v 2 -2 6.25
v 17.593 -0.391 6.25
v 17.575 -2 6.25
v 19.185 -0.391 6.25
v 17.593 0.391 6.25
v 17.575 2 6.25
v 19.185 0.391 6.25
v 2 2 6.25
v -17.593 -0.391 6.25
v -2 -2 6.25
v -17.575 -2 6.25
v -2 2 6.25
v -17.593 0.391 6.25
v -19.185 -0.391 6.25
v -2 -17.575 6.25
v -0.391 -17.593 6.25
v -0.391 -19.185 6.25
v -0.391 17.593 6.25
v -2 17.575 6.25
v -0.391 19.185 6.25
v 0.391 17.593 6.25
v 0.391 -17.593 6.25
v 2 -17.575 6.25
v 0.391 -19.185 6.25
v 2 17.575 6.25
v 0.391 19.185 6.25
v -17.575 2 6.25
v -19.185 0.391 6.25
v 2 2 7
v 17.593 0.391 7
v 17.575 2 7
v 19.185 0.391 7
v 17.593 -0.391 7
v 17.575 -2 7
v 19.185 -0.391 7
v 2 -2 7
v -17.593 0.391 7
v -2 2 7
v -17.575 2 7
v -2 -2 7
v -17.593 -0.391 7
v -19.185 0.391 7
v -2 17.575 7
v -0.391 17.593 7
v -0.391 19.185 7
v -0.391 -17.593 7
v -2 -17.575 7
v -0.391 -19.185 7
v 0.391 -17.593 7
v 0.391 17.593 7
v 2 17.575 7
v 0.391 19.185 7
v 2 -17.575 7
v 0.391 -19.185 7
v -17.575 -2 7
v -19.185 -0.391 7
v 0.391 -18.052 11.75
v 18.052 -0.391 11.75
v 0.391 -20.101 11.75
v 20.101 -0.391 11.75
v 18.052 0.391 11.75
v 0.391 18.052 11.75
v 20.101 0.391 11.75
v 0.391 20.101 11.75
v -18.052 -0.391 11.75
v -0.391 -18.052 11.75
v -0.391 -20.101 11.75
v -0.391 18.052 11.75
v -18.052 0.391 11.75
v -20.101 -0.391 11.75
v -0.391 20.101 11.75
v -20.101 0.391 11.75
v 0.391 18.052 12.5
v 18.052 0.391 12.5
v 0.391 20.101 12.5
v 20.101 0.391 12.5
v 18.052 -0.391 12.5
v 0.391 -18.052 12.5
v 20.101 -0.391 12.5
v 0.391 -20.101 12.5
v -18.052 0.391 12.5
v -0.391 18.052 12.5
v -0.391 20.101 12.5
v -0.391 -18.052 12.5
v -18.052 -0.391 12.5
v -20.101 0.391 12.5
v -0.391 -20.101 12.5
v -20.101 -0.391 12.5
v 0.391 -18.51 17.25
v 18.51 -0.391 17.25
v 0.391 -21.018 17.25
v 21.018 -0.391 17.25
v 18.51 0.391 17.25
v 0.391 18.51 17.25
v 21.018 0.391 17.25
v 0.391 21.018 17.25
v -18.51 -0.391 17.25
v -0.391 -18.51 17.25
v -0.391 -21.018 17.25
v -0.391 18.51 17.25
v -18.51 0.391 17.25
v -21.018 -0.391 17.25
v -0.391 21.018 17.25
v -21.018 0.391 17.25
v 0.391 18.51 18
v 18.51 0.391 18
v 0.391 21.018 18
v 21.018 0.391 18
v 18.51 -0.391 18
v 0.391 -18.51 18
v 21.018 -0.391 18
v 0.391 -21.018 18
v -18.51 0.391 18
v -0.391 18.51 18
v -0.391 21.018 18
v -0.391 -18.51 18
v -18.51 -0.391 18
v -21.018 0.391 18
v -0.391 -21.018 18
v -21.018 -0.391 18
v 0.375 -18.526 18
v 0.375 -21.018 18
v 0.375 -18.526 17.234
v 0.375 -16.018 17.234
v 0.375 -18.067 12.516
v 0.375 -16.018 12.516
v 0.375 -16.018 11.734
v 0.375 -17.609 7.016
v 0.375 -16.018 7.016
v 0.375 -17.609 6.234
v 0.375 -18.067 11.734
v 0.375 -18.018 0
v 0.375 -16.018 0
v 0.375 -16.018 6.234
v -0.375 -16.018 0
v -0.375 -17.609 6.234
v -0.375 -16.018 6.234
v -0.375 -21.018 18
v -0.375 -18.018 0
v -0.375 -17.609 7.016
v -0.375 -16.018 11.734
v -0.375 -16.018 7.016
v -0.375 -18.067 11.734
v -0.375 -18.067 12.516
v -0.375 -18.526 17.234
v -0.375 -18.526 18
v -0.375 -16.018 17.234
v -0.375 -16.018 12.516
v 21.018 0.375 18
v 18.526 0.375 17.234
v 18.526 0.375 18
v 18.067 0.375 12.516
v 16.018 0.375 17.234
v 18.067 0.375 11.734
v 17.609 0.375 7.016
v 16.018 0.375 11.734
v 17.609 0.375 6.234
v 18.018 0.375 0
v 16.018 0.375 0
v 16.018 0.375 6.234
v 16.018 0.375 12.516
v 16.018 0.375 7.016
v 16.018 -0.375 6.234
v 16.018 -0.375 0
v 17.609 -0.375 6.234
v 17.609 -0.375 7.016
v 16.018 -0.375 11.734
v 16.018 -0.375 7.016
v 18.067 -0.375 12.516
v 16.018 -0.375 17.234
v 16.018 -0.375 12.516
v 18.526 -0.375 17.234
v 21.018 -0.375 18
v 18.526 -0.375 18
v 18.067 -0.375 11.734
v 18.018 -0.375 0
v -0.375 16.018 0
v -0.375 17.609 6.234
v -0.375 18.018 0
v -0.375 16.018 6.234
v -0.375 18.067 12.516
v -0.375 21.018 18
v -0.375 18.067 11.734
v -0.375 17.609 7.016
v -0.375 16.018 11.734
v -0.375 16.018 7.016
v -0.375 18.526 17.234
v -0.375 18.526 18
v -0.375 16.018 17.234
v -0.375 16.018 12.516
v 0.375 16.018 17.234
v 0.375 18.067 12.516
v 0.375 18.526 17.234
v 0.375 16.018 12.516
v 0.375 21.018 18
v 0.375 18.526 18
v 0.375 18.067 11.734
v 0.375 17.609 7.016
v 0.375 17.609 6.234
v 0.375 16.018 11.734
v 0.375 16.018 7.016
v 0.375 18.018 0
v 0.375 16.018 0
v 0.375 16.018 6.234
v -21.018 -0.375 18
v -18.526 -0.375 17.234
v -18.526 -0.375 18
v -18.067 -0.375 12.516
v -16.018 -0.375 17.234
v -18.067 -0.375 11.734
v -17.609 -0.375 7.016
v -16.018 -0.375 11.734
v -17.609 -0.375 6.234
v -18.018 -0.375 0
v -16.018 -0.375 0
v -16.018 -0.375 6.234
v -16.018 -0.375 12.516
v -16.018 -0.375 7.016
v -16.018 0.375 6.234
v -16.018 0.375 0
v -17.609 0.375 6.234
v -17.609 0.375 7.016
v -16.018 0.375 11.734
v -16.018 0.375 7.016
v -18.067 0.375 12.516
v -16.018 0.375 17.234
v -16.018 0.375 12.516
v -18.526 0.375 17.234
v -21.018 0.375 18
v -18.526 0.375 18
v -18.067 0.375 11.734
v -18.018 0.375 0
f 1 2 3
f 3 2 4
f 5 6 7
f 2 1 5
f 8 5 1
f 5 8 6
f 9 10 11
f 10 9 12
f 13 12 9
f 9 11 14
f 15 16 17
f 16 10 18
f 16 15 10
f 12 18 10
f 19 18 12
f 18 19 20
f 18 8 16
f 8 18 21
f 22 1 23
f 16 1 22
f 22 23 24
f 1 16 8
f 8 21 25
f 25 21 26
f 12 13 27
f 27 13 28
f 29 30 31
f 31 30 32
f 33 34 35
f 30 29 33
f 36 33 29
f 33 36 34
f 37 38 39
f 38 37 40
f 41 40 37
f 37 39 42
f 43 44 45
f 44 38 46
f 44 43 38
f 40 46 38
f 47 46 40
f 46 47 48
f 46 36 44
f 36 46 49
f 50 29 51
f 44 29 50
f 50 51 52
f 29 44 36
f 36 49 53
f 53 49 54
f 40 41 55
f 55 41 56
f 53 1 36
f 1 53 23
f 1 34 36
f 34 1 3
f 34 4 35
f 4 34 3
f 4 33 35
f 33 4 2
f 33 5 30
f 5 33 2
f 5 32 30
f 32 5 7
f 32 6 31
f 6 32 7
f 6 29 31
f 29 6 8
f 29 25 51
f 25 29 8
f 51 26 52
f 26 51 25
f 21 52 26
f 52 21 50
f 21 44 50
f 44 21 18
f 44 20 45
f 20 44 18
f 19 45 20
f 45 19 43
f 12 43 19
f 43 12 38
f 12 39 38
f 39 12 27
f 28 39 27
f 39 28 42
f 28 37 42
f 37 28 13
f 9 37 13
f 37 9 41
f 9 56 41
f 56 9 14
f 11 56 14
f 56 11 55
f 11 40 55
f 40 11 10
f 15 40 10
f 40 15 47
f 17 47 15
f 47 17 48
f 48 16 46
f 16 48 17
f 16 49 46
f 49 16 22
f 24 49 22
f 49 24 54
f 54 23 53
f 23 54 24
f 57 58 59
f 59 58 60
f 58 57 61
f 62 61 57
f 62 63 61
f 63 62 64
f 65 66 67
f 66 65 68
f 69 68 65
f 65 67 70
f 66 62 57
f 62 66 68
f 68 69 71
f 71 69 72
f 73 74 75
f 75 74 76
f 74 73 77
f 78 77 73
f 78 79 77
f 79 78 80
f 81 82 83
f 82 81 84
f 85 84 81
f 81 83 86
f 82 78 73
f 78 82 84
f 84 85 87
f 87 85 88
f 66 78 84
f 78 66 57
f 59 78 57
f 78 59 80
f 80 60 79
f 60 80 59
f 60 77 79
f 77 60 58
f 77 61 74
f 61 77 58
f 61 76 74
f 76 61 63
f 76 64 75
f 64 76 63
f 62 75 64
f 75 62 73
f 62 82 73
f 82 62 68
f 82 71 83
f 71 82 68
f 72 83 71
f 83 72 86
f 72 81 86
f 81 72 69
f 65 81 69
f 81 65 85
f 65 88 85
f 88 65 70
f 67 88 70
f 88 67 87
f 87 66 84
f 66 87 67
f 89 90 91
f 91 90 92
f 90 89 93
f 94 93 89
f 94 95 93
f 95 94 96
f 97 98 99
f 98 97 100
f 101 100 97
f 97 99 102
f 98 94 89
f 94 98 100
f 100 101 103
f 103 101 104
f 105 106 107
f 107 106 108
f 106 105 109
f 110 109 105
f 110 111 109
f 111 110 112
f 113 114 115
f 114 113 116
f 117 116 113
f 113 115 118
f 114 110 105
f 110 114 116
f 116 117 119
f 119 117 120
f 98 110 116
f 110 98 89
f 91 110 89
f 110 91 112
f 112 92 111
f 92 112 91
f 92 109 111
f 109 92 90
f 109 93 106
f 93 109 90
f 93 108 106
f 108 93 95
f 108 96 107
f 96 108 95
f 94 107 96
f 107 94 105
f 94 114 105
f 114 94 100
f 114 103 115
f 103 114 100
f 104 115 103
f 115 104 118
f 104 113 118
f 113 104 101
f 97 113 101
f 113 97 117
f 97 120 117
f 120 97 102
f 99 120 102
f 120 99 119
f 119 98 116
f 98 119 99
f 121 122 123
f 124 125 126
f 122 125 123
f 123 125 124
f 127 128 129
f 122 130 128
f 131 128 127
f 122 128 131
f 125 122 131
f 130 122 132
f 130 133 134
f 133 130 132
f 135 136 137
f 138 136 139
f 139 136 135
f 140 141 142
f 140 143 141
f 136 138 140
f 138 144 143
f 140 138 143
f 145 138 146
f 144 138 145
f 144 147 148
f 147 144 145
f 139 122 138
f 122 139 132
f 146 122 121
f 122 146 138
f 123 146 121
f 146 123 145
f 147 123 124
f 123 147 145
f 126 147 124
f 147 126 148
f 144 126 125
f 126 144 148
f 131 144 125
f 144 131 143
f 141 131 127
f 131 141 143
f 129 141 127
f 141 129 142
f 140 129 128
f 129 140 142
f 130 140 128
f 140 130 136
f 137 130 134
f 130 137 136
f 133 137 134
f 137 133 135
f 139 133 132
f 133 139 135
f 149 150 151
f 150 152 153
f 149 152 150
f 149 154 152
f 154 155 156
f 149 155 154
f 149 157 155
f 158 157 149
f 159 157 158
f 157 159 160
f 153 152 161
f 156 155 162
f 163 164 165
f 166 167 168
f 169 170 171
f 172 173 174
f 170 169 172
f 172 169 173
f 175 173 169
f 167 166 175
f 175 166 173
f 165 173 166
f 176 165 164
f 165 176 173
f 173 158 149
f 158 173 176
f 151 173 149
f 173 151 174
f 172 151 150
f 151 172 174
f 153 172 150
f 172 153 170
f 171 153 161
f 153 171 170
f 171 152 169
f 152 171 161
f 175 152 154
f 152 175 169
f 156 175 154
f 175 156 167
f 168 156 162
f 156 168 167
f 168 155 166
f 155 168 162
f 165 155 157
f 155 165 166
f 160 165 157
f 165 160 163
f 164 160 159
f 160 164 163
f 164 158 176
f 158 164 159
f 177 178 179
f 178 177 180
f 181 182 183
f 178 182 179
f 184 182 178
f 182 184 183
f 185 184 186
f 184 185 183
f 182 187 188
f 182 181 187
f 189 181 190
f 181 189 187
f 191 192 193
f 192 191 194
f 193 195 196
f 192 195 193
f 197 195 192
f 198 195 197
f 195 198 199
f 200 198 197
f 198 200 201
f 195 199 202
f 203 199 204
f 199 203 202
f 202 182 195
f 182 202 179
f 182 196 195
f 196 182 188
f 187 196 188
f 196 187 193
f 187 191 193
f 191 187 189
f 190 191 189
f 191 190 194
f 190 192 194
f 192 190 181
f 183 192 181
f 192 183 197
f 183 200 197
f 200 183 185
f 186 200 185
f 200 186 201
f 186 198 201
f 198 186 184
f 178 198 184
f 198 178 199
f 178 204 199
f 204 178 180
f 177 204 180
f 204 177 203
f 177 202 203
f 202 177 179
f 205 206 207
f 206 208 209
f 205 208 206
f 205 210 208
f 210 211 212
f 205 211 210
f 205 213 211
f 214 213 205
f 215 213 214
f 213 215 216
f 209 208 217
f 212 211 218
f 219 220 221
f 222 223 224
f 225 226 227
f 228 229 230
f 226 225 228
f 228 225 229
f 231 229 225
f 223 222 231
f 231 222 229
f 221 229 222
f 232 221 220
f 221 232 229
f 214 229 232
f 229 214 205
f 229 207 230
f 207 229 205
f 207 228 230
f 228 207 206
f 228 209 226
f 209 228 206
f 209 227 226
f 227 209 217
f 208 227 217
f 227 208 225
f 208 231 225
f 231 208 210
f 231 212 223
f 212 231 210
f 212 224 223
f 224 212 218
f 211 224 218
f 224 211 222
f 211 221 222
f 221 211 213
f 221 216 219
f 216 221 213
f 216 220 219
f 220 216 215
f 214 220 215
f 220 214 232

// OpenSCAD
// file: ../src/functions.scad
module shelf(type, diameter,leg_width) {
    if (type == 0)
    round_shelf(diameter, leg_width);
    if (type == 1)
    square_shelf(diameter, leg_width);
    if (type == 2)
    square_shelf_leg_supports(diameter, leg_width);
}

module round_shelf(diameter,leg_width) {
    difference() {
        circle(d=diameter);
        leg_slots(diameter, leg_width);
    }
}

module square_shelf(diameter,leg_width) {
    difference() {
        hull() {
            leg_slots(diameter, leg_width);
        }
        leg_slots(diameter, leg_width);
    }
}

module square_shelf_leg_supports(diameter,leg_width) {
    intersection() {
        square_shelf(diameter, leg_width);
        for(i=[0:leg_count-1]) {
            rotate(i*360/leg_count)
            translate([-leg_support/2,-diameter/2])
            square([leg_support,diameter/2]);
        }
    }
}


module leg_slots(diameter, leg_width) {
    for(i=[0:leg_count-1]) {
        rotate(i*360/leg_count)
        translate([-leg_thick/2-gap,-diameter/2])
        square([leg_thick+gapp,leg_width]);
    }
}

module shelf_number(i) {
        shelf(shelves[i], tan(leg_angle)*((top_height-leg_height)/(shelf_count-1)*i+leg_height)*2+bottom,(tan(leg_angle)*((top_height-leg_height)/(shelf_count-1)*i+leg_height)+min_leg)/2+gap/2);
}

module assemble_shelves() {
    for(i=[0:shelf_count-1]) {
        translate([0,0,(top_height-leg_height)/(shelf_count-1)*i+leg_height-plywood])
        linear_extrude(height=plywood)
        shelf_number(i);
    }
}

module assemble_legs() {
    for(i=[0:leg_count-1]) {
        rotate(i*360/leg_count)
        translate([-leg_thick/2-plywood/2,0,0])
        for(l=[1:leg_layers]) {
            translate([plywood*l,0,0])
            leg_3d();
        }
    }
}

//shelf(bottom,min_leg);

module leg() {
    difference() {
        square([min_leg+(top-bottom)/2,top_height]);
        translate([min_leg,0])
        rotate(-leg_angle)
        square([min_leg+(top-bottom),top_height*2]);
        for(i=[0:shelf_count-1]) {
            translate([0,(top_height-leg_height)/(shelf_count-1)*i+leg_height-plywood-gap])
            square([(tan(leg_angle)*((top_height-leg_height)/(shelf_count-1)*i+leg_height)+min_leg)/2+gap/2,plywood+gapp]);
        }
            
    }
}

module leg_3d() {
    translate([0,-bottom/2+min_leg,0])
    rotate([90,0,-90])
    translate([0,0,-plywood/2])
    color("lime")
    linear_extrude(height=plywood)
    leg();
}

module assemble() {
    assemble_shelves();
    assemble_legs();
}

module plate() {
    for(i=[0:leg_count/2-1]) {
        translate([i*((top-bottom)/2+min_leg*2+tree*2),0]) {
            leg();
            translate([min_leg+(top-bottom)/2+tree+min_leg,top_height])
            rotate(180)
            leg();
        }
    }
    if(leg_count%2 != 0) {
            translate([floor(leg_count/2)*((top-bottom)/2+min_leg*2+tree*2),0])
            leg();
    }
    translate([0,-top/2-tree])
    for(i=[0:shelf_count-1]) {
        //too much math, I can drag in inkscape
        translate([top*i,0])
        shelf_number(i);
    }
}
// main file
include <../src/functions.scad>;

square_top=30;
shelves = [2, 1, 1];
// 0 = round
// 1 = square
// 2 = leg_supports (square)
shelf_count = len(shelves);
leg_layers=1;
leg_count = 4;
leg_height = 7 + sin($t*360)*6;
top_height = 18;
min_leg = 2; //smallest size a leg can be
plywood = 0.75;
gap = 1/64;
gapp = gap*2;
pad = 0.1;
padd = pad*2;
leg_thick=plywood*leg_layers;

leg_support=4;

tree=2;

top = sqrt(2*pow((square_top/2),2))*2-leg_thick/2-gap; //diameter
bottom = top-6; //diameter
leg_angle = atan((top-bottom)/2/top_height);
echo("top is", top);

$fn=120;


// RENDER gif
module demo() {
    assemble();
}

demo();
